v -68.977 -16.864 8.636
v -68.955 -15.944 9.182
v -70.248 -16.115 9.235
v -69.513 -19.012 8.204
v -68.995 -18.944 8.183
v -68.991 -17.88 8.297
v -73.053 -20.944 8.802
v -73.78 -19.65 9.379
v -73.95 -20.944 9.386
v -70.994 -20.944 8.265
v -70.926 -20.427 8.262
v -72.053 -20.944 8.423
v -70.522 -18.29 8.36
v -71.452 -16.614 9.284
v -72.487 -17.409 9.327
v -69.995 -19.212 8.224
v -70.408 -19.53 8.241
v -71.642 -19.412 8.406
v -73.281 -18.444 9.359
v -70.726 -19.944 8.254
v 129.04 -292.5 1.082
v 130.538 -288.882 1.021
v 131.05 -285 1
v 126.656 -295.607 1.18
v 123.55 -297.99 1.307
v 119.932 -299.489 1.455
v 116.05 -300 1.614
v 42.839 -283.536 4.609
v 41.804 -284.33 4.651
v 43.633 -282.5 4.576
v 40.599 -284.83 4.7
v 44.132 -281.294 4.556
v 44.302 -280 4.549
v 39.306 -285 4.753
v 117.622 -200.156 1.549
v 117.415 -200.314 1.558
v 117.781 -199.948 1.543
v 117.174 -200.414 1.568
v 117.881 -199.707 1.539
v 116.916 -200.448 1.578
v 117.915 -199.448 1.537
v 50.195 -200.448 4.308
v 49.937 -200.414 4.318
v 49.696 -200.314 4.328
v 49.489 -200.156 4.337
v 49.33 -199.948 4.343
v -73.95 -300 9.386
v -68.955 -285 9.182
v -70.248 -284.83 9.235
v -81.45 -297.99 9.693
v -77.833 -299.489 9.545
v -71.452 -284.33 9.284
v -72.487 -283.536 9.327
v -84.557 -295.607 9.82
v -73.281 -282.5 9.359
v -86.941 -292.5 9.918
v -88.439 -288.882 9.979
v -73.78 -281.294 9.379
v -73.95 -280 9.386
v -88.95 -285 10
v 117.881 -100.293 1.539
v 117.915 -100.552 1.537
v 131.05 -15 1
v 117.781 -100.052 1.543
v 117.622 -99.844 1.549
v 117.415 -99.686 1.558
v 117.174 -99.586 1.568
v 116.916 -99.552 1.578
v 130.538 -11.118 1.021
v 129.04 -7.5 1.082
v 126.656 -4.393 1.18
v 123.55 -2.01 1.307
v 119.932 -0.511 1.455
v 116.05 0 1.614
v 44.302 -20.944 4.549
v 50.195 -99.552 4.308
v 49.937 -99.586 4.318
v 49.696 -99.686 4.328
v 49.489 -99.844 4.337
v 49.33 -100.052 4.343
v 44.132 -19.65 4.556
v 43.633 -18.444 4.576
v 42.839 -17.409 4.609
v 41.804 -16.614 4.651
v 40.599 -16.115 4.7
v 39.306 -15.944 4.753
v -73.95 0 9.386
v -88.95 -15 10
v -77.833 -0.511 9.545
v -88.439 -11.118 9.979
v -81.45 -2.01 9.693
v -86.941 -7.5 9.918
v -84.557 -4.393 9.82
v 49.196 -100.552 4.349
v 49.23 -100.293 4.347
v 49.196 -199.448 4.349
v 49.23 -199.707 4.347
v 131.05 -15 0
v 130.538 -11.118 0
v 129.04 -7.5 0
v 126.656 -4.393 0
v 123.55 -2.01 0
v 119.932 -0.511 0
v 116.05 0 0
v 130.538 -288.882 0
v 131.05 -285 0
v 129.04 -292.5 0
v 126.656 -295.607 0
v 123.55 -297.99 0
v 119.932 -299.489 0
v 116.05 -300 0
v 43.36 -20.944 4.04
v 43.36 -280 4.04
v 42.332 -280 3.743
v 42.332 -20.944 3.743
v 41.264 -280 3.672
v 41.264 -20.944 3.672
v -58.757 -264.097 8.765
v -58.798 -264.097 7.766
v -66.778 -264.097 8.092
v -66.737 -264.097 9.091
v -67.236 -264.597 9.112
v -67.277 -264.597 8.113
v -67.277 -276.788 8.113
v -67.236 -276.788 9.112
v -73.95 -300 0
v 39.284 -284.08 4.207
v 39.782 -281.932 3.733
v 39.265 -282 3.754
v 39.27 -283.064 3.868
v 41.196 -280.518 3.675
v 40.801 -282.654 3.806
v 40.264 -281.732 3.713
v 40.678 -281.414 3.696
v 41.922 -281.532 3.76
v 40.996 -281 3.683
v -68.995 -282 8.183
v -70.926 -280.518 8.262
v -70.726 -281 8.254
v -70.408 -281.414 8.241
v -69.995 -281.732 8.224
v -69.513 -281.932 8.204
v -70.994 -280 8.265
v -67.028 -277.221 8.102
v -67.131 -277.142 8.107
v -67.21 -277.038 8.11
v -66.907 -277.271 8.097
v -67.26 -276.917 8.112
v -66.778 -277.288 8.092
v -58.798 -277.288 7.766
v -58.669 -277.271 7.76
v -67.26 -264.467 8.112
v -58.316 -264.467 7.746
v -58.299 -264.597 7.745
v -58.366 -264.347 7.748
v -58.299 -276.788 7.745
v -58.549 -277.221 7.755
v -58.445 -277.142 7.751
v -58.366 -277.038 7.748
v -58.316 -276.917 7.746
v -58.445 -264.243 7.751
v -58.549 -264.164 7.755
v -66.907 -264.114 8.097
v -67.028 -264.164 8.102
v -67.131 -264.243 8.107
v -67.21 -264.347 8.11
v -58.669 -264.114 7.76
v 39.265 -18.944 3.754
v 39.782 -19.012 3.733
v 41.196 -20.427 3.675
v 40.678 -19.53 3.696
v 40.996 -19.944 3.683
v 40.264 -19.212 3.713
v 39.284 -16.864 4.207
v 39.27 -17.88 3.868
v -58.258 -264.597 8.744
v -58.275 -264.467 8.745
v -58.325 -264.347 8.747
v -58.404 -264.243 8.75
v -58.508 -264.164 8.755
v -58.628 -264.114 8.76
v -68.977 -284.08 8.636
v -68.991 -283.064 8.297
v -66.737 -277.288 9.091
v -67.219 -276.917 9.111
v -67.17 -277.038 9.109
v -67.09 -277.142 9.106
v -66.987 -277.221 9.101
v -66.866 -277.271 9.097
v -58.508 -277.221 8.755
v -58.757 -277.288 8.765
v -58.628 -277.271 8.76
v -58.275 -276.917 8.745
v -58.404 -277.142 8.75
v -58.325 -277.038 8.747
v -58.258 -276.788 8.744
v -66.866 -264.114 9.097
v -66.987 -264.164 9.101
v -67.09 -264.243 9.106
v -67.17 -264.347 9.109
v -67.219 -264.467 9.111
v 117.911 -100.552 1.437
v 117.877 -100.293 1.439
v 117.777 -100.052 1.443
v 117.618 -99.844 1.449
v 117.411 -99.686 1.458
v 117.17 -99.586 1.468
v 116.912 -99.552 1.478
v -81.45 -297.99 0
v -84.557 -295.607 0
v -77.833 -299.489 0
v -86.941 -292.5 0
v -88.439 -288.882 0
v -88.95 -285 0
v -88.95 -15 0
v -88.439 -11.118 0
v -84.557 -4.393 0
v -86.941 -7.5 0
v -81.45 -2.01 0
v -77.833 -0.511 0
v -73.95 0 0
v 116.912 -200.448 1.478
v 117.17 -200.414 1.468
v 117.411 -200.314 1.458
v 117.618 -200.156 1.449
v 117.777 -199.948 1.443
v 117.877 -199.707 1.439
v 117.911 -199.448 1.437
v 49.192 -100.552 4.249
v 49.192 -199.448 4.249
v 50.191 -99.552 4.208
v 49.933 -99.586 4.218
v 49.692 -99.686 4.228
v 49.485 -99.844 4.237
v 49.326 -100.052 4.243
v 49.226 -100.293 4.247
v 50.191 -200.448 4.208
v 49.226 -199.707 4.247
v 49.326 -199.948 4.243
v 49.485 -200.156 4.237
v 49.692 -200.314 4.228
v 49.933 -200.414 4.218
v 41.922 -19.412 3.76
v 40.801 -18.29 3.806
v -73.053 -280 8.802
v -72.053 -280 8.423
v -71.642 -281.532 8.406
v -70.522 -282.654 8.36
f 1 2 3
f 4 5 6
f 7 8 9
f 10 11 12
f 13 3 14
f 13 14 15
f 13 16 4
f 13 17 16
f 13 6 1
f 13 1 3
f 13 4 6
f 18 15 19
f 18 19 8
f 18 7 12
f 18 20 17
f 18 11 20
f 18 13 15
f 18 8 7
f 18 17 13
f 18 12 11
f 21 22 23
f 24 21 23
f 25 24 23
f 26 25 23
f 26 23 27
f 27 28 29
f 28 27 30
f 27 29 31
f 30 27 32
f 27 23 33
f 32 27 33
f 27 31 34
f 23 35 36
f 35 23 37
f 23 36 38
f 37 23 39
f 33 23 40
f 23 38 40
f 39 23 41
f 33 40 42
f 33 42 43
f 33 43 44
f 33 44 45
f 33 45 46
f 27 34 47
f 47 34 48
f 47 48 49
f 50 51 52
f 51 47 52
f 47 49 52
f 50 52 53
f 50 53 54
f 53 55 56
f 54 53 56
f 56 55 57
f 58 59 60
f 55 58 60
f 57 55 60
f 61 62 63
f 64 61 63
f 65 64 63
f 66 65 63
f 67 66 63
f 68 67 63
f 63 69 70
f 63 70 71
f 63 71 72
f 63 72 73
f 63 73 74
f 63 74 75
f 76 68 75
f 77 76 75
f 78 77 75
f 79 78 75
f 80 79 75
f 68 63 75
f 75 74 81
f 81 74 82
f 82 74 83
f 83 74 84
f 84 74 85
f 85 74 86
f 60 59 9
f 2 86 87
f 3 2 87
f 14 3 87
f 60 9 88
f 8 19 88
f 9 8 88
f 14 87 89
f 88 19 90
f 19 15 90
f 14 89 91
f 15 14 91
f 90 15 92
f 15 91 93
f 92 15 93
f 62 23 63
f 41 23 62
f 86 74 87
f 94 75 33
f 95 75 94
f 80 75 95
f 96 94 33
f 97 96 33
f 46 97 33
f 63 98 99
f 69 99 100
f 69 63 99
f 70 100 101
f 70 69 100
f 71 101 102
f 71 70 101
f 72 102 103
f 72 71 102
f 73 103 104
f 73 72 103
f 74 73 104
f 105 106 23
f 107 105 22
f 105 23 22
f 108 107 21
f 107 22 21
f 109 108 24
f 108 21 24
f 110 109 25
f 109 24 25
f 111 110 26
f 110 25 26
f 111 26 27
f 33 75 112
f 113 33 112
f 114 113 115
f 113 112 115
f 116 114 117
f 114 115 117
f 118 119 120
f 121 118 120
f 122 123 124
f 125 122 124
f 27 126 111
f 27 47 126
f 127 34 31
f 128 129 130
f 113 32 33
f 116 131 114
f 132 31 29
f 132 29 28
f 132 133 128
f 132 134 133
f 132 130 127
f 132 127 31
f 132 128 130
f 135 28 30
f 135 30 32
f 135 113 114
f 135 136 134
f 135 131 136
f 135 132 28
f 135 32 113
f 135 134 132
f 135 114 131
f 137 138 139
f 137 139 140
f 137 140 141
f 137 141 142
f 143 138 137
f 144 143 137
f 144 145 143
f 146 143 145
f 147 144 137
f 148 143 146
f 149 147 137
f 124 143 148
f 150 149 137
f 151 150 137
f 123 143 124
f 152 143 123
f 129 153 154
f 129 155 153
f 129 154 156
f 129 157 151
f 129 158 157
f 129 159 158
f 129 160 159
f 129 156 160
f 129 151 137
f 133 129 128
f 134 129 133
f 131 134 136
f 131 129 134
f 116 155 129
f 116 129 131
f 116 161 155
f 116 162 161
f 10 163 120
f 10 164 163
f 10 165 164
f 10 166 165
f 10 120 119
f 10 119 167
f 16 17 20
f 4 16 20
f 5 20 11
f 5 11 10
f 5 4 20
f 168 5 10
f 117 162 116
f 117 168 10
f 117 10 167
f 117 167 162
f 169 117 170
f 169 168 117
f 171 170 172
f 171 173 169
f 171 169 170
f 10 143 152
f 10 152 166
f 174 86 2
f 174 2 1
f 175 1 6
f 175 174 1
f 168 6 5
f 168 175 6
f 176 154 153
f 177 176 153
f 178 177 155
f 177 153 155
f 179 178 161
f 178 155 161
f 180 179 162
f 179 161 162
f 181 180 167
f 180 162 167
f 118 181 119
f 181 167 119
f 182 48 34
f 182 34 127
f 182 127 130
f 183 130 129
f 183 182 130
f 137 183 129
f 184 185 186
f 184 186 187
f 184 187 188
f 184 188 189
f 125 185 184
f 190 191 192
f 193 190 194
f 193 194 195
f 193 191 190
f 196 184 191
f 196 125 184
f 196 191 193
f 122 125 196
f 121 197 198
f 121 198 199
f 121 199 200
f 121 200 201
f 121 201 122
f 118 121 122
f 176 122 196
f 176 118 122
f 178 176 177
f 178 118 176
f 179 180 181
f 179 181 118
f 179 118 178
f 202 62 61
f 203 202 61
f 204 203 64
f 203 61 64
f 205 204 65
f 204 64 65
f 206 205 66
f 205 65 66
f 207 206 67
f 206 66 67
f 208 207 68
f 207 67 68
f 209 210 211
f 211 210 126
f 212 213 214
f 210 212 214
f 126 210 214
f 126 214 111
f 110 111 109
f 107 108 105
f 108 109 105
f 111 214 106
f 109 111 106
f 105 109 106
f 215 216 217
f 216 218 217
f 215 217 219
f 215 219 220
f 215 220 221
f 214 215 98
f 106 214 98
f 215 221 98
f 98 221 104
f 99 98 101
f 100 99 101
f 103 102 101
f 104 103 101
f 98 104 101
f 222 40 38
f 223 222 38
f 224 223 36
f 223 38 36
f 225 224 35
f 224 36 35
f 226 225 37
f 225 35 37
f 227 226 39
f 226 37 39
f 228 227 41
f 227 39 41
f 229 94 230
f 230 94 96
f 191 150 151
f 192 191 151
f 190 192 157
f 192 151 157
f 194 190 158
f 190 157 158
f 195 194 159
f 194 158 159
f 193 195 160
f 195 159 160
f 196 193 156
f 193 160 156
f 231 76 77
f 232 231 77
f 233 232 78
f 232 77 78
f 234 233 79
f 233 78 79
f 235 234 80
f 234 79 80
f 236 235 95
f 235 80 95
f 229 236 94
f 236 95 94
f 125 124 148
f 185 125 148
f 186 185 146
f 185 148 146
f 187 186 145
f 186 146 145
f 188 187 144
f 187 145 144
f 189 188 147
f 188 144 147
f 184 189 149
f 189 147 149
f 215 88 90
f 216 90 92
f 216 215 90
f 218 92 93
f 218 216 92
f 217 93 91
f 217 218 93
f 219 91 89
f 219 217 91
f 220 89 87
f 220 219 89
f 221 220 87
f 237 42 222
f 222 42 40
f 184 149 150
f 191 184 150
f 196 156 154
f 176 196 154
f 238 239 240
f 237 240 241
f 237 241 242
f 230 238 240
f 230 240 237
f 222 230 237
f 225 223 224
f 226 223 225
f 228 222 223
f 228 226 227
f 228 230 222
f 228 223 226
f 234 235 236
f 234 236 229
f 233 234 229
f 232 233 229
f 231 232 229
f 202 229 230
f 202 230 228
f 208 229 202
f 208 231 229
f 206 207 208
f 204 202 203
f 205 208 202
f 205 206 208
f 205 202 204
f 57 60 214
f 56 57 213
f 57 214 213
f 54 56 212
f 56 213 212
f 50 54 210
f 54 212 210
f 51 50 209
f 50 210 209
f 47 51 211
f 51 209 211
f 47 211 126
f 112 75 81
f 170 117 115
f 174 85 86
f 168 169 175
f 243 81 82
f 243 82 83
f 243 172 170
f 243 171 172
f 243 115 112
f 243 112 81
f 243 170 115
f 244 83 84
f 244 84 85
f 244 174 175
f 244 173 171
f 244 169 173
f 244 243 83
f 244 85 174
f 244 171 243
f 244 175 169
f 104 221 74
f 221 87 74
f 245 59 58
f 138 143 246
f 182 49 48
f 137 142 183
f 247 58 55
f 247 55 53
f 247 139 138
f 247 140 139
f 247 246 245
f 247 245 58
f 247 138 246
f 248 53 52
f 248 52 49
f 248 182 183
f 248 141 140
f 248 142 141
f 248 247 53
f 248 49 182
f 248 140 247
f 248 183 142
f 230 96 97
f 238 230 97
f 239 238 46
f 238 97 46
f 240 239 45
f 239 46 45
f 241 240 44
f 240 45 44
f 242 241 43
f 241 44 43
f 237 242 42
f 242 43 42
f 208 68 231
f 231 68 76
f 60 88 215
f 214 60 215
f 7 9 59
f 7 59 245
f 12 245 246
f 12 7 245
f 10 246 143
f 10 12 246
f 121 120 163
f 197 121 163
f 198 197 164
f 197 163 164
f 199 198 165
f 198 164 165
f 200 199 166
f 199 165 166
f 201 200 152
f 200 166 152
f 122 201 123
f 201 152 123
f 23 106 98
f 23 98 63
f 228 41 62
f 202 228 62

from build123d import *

# Parameters (mm, degrees)
F1_DEPTH     = 300
F2_R         = 15
F4_DEPTH     = 1
F5_T1_DEPTH  = 108.3513065438
F5_T3_DEPTH  = 259.0557519346
F5_T5_DEPTH  = 108.3513065438
F5_T8_ANGLE  = 90
F5_T10_ANGLE = 90
F5_T12_ANGLE = 90
F5_T14_ANGLE = 90
F7_DEPTH     = 0.1
F9_DEPTH     = 1


# Not quite as in the source:
# - a fillet or chamfer that OpenCascade refuses, or shapes differently, is made with other operations: its cross-section is extruded or revolved along the edge and cut away or added


with BuildPart() as f1:
    # F0 (on Front) → F1 (new body)
    with BuildSketch(Plane.XZ):
        Polygon((-88.9504104853, 0), (131.0495895147, 0), (131.0495895147, 1), (-88.9504104853, 10), align=None)
    extrude(amount=F1_DEPTH)

    # F2
    f2_edges = [f1.edges().sort_by_distance(p)[0] for p in [
        (-88.95041, -300, 5),
        (131.04959, -300, 0.5),
        (131.04959, 0, 0.5),
        (-88.95041, 0, 5),
    ]]
    fillet(f2_edges, radius=F2_R)

    # F3 (on face) → F4 (cut)
    with BuildSketch(Plane(origin=(0.2597928415, 0, 6.3504916821), x_dir=(0.999164272, 0, -0.040874902), z_dir=(0.040874902, 0, 0.999164272))):
        with BuildLine():
            ThreePointArc((-74.2722747486, -280), (-72.8078086545, -283.5355339059), (-69.2722747486, -285))
            Line((-69.2722747486, -285), (39.0790317953, -285))
            ThreePointArc((39.0790317953, -285), (42.6145657012, -283.5355339059), (44.0790317953, -280))
            Line((44.0790317953, -280), (44.0790317953, -20.9442480654))
            ThreePointArc((44.0790317953, -20.9442480654), (42.6145657012, -17.4087141594), (39.0790317953, -15.9442480654))
            Line((39.0790317953, -15.9442480654), (-69.2722747486, -15.9442480654))
            ThreePointArc((-69.2722747486, -15.9442480654), (-72.8078086545, -17.4087141594), (-74.2722747486, -20.9442480654))
            Line((-74.2722747486, -20.9442480654), (-74.2722747486, -280))
        make_face()
    extrude(amount=-F4_DEPTH, mode=Mode.SUBTRACT)

    # F5: fillet of radius 5 on 8 edges, made by hand

    # F5_s2 → F5_t1 (join)
    with BuildSketch(Plane(origin=(-69.214381967, 0, 2.8314974441), x_dir=(0, 1, 0), z_dir=(0.999164272, 0, -0.040874902))):
        with BuildLine():
            ThreePointArc((-285, 6.3558034051), (-283.5811388301, 5.6123869149), (-282, 5.3558034051))
            Line((-282, 5.3558034051), (-285, 5.3558034051))
            Line((-285, 5.3558034051), (-285, 6.3558034051))
        make_face()
    extrude(amount=F5_T1_DEPTH)

    # F5_s4 → F5_t3 (join)
    with BuildSketch(Plane.XZ.offset(20.9442480654)):
        with BuildLine():
            ThreePointArc((44.3019865544, 4.5487655756), (42.8539240904, 3.8639661907), (41.2636188365, 3.6722260098))
            Line((41.2636188365, 3.6722260098), (44.2611116524, 3.5496013037))
            Line((44.2611116524, 3.5496013037), (44.3019865544, 4.5487655756))
        make_face()
        with BuildLine():
            ThreePointArc((-73.9504104853, 9.3863636364), (-72.5631221736, 8.5855726288), (-70.9937925714, 8.2645746583))
            Line((-70.9937925714, 8.2645746583), (-73.9912853873, 8.3871993644))
            Line((-73.9912853873, 8.3871993644), (-73.9504104853, 9.3863636364))
        make_face()
    extrude(amount=F5_T3_DEPTH)

    # F5_s6 → F5_t5 (join)
    with BuildSketch(Plane(origin=(39.0463723531, 0, -1.5973515963), x_dir=(0, 1, 0), z_dir=(-0.999164272, 0, 0.040874902))):
        with BuildLine():
            ThreePointArc((-15.9442480654, -6.3558034051), (-17.3631092353, -5.6123869149), (-18.9442480654, -5.3558034051))
            Line((-18.9442480654, -5.3558034051), (-15.9442480654, -5.3558034051))
            Line((-15.9442480654, -5.3558034051), (-15.9442480654, -6.3558034051))
        make_face()
    extrude(amount=F5_T5_DEPTH)

    # F5_s7 → F5_t8 (revolve)
    with BuildSketch(Plane.XZ.offset(280)):
        with BuildLine():
            ThreePointArc((-73.9504104853, 9.3863636364), (-72.5631221736, 8.5855726288), (-70.9937925714, 8.2645746583))
            Line((-70.9937925714, 8.2645746583), (-73.9912853873, 8.3871993644))
            Line((-73.9912853873, 8.3871993644), (-73.9504104853, 9.3863636364))
        make_face()
    revolve(axis=Axis((-68.9954640274, -280, 8.1828248542), (0.040874902, 0, 0.999164272)), revolution_arc=F5_T8_ANGLE)

    # F5_s9 → F5_t10 (revolve)
    with BuildSketch(Plane(origin=(39.046372353, 0, -1.5973515963), x_dir=(0, 1, 0), z_dir=(-0.999164272, 0, 0.040874902))):
        with BuildLine():
            ThreePointArc((-285, -6.3558034051), (-283.5811388301, -5.6123869149), (-282, -5.3558034051))
            Line((-282, -5.3558034051), (-285, -5.3558034051))
            Line((-285, -5.3558034051), (-285, -6.3558034051))
        make_face()
    revolve(axis=Axis((39.2652902926, -280, 3.7539758139), (0.040874902, 0, 0.999164272)), revolution_arc=F5_T10_ANGLE)

    # F5_s11 → F5_t12 (revolve)
    with BuildSketch(Plane.XZ.offset(20.9442480654)):
        with BuildLine():
            ThreePointArc((44.3019865544, 4.5487655756), (42.8539240904, 3.8639661907), (41.2636188365, 3.6722260098))
            Line((41.2636188365, 3.6722260098), (44.2611116524, 3.5496013037))
            Line((44.2611116524, 3.5496013037), (44.3019865544, 4.5487655756))
        make_face()
    revolve(axis=Axis((39.2652902926, -20.9442480654, 3.7539758139), (0.040874902, 0, 0.999164272)), revolution_arc=F5_T12_ANGLE)

    # F5_s13 → F5_t14 (revolve)
    with BuildSketch(Plane(origin=(-69.214381967, 0, 2.8314974441), x_dir=(0, 1, 0), z_dir=(0.999164272, 0, -0.040874902))):
        with BuildLine():
            ThreePointArc((-15.9442480654, 6.3558034051), (-17.3631092353, 5.6123869149), (-18.9442480654, 5.3558034051))
            Line((-18.9442480654, 5.3558034051), (-15.9442480654, 5.3558034051))
            Line((-15.9442480654, 5.3558034051), (-15.9442480654, 6.3558034051))
        make_face()
    revolve(axis=Axis((-68.9954640274, -20.9442480654, 8.1828248542), (0.040874902, 0, 0.999164272)), revolution_arc=F5_T14_ANGLE)

    # F6 (on face) → F7 (cut)
    with BuildSketch(Plane(origin=(0.2597928415, 0, 6.3504916821), x_dir=(0.999164272, 0, -0.040874902), z_dir=(0.040874902, 0, 0.999164272))):
        with BuildLine():
            ThreePointArc((117.753483355, -100.5515882969), (117.4605901362, -99.8444815157), (116.753483355, -99.5515882969))
            Line((116.753483355, -99.5515882969), (49.977278173, -99.5515882969))
            ThreePointArc((49.977278173, -99.5515882969), (49.2701713918, -99.8444815157), (48.977278173, -100.5515882969))
            Line((48.977278173, -100.5515882969), (48.977278173, -199.4484117031))
            ThreePointArc((48.977278173, -199.4484117031), (49.2701713918, -200.1555184843), (49.977278173, -200.4484117031))
            Line((49.977278173, -200.4484117031), (116.753483355, -200.4484117031))
            ThreePointArc((116.753483355, -200.4484117031), (117.4605901362, -200.1555184843), (117.753483355, -199.4484117031))
            Line((117.753483355, -199.4484117031), (117.753483355, -100.5515882969))
        make_face()
    extrude(amount=-F7_DEPTH, mode=Mode.SUBTRACT)

    # F8 (on face) → F9 (join)
    with BuildSketch(Plane(origin=(0.2189179395, 0, 5.3513274101), x_dir=(0.999164272, 0, -0.040874902), z_dir=(0.040874902, 0, 0.999164272))):
        with BuildLine():
            ThreePointArc((-67.5527229905, -276.7879536152), (-67.4062763811, -277.1415070058), (-67.0527229905, -277.2879536152))
            Line((-67.0527229905, -277.2879536152), (-59.0665953457, -277.2879536152))
            ThreePointArc((-59.0665953457, -277.2879536152), (-58.7130419551, -277.1415070058), (-58.5665953457, -276.7879536152))
            Line((-58.5665953457, -276.7879536152), (-58.5665953457, -264.596647501))
            ThreePointArc((-58.5665953457, -264.596647501), (-58.7130419551, -264.2430941104), (-59.0665953457, -264.096647501))
            Line((-59.0665953457, -264.096647501), (-67.0527229905, -264.096647501))
            ThreePointArc((-67.0527229905, -264.096647501), (-67.4062763811, -264.2430941104), (-67.5527229905, -264.596647501))
            Line((-67.5527229905, -264.596647501), (-67.5527229905, -276.7879536152))
        make_face()
    extrude(amount=F9_DEPTH)


solid = f1.part
